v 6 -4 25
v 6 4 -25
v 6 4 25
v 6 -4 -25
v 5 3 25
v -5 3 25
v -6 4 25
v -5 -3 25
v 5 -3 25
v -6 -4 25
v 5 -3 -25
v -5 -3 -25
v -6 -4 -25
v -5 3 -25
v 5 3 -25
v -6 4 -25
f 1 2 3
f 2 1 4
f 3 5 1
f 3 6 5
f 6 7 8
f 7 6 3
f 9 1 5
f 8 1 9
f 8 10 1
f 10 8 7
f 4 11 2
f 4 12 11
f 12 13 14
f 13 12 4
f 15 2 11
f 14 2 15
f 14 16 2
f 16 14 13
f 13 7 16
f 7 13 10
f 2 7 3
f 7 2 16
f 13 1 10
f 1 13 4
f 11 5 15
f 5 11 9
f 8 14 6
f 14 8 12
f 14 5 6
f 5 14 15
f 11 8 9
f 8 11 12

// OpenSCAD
$fn=64;

module rect_box_section(outer_x=12, outer_y=8, wall=1, length=50) {
    inner_x = outer_x - 2*wall;
    inner_y = outer_y - 2*wall;
    difference() {
        cube([outer_x, outer_y, length], center=true);
        cube([inner_x, inner_y, length+0.2], center=true);
    }
}

rect_box_section(12, 8, 1, 50);
